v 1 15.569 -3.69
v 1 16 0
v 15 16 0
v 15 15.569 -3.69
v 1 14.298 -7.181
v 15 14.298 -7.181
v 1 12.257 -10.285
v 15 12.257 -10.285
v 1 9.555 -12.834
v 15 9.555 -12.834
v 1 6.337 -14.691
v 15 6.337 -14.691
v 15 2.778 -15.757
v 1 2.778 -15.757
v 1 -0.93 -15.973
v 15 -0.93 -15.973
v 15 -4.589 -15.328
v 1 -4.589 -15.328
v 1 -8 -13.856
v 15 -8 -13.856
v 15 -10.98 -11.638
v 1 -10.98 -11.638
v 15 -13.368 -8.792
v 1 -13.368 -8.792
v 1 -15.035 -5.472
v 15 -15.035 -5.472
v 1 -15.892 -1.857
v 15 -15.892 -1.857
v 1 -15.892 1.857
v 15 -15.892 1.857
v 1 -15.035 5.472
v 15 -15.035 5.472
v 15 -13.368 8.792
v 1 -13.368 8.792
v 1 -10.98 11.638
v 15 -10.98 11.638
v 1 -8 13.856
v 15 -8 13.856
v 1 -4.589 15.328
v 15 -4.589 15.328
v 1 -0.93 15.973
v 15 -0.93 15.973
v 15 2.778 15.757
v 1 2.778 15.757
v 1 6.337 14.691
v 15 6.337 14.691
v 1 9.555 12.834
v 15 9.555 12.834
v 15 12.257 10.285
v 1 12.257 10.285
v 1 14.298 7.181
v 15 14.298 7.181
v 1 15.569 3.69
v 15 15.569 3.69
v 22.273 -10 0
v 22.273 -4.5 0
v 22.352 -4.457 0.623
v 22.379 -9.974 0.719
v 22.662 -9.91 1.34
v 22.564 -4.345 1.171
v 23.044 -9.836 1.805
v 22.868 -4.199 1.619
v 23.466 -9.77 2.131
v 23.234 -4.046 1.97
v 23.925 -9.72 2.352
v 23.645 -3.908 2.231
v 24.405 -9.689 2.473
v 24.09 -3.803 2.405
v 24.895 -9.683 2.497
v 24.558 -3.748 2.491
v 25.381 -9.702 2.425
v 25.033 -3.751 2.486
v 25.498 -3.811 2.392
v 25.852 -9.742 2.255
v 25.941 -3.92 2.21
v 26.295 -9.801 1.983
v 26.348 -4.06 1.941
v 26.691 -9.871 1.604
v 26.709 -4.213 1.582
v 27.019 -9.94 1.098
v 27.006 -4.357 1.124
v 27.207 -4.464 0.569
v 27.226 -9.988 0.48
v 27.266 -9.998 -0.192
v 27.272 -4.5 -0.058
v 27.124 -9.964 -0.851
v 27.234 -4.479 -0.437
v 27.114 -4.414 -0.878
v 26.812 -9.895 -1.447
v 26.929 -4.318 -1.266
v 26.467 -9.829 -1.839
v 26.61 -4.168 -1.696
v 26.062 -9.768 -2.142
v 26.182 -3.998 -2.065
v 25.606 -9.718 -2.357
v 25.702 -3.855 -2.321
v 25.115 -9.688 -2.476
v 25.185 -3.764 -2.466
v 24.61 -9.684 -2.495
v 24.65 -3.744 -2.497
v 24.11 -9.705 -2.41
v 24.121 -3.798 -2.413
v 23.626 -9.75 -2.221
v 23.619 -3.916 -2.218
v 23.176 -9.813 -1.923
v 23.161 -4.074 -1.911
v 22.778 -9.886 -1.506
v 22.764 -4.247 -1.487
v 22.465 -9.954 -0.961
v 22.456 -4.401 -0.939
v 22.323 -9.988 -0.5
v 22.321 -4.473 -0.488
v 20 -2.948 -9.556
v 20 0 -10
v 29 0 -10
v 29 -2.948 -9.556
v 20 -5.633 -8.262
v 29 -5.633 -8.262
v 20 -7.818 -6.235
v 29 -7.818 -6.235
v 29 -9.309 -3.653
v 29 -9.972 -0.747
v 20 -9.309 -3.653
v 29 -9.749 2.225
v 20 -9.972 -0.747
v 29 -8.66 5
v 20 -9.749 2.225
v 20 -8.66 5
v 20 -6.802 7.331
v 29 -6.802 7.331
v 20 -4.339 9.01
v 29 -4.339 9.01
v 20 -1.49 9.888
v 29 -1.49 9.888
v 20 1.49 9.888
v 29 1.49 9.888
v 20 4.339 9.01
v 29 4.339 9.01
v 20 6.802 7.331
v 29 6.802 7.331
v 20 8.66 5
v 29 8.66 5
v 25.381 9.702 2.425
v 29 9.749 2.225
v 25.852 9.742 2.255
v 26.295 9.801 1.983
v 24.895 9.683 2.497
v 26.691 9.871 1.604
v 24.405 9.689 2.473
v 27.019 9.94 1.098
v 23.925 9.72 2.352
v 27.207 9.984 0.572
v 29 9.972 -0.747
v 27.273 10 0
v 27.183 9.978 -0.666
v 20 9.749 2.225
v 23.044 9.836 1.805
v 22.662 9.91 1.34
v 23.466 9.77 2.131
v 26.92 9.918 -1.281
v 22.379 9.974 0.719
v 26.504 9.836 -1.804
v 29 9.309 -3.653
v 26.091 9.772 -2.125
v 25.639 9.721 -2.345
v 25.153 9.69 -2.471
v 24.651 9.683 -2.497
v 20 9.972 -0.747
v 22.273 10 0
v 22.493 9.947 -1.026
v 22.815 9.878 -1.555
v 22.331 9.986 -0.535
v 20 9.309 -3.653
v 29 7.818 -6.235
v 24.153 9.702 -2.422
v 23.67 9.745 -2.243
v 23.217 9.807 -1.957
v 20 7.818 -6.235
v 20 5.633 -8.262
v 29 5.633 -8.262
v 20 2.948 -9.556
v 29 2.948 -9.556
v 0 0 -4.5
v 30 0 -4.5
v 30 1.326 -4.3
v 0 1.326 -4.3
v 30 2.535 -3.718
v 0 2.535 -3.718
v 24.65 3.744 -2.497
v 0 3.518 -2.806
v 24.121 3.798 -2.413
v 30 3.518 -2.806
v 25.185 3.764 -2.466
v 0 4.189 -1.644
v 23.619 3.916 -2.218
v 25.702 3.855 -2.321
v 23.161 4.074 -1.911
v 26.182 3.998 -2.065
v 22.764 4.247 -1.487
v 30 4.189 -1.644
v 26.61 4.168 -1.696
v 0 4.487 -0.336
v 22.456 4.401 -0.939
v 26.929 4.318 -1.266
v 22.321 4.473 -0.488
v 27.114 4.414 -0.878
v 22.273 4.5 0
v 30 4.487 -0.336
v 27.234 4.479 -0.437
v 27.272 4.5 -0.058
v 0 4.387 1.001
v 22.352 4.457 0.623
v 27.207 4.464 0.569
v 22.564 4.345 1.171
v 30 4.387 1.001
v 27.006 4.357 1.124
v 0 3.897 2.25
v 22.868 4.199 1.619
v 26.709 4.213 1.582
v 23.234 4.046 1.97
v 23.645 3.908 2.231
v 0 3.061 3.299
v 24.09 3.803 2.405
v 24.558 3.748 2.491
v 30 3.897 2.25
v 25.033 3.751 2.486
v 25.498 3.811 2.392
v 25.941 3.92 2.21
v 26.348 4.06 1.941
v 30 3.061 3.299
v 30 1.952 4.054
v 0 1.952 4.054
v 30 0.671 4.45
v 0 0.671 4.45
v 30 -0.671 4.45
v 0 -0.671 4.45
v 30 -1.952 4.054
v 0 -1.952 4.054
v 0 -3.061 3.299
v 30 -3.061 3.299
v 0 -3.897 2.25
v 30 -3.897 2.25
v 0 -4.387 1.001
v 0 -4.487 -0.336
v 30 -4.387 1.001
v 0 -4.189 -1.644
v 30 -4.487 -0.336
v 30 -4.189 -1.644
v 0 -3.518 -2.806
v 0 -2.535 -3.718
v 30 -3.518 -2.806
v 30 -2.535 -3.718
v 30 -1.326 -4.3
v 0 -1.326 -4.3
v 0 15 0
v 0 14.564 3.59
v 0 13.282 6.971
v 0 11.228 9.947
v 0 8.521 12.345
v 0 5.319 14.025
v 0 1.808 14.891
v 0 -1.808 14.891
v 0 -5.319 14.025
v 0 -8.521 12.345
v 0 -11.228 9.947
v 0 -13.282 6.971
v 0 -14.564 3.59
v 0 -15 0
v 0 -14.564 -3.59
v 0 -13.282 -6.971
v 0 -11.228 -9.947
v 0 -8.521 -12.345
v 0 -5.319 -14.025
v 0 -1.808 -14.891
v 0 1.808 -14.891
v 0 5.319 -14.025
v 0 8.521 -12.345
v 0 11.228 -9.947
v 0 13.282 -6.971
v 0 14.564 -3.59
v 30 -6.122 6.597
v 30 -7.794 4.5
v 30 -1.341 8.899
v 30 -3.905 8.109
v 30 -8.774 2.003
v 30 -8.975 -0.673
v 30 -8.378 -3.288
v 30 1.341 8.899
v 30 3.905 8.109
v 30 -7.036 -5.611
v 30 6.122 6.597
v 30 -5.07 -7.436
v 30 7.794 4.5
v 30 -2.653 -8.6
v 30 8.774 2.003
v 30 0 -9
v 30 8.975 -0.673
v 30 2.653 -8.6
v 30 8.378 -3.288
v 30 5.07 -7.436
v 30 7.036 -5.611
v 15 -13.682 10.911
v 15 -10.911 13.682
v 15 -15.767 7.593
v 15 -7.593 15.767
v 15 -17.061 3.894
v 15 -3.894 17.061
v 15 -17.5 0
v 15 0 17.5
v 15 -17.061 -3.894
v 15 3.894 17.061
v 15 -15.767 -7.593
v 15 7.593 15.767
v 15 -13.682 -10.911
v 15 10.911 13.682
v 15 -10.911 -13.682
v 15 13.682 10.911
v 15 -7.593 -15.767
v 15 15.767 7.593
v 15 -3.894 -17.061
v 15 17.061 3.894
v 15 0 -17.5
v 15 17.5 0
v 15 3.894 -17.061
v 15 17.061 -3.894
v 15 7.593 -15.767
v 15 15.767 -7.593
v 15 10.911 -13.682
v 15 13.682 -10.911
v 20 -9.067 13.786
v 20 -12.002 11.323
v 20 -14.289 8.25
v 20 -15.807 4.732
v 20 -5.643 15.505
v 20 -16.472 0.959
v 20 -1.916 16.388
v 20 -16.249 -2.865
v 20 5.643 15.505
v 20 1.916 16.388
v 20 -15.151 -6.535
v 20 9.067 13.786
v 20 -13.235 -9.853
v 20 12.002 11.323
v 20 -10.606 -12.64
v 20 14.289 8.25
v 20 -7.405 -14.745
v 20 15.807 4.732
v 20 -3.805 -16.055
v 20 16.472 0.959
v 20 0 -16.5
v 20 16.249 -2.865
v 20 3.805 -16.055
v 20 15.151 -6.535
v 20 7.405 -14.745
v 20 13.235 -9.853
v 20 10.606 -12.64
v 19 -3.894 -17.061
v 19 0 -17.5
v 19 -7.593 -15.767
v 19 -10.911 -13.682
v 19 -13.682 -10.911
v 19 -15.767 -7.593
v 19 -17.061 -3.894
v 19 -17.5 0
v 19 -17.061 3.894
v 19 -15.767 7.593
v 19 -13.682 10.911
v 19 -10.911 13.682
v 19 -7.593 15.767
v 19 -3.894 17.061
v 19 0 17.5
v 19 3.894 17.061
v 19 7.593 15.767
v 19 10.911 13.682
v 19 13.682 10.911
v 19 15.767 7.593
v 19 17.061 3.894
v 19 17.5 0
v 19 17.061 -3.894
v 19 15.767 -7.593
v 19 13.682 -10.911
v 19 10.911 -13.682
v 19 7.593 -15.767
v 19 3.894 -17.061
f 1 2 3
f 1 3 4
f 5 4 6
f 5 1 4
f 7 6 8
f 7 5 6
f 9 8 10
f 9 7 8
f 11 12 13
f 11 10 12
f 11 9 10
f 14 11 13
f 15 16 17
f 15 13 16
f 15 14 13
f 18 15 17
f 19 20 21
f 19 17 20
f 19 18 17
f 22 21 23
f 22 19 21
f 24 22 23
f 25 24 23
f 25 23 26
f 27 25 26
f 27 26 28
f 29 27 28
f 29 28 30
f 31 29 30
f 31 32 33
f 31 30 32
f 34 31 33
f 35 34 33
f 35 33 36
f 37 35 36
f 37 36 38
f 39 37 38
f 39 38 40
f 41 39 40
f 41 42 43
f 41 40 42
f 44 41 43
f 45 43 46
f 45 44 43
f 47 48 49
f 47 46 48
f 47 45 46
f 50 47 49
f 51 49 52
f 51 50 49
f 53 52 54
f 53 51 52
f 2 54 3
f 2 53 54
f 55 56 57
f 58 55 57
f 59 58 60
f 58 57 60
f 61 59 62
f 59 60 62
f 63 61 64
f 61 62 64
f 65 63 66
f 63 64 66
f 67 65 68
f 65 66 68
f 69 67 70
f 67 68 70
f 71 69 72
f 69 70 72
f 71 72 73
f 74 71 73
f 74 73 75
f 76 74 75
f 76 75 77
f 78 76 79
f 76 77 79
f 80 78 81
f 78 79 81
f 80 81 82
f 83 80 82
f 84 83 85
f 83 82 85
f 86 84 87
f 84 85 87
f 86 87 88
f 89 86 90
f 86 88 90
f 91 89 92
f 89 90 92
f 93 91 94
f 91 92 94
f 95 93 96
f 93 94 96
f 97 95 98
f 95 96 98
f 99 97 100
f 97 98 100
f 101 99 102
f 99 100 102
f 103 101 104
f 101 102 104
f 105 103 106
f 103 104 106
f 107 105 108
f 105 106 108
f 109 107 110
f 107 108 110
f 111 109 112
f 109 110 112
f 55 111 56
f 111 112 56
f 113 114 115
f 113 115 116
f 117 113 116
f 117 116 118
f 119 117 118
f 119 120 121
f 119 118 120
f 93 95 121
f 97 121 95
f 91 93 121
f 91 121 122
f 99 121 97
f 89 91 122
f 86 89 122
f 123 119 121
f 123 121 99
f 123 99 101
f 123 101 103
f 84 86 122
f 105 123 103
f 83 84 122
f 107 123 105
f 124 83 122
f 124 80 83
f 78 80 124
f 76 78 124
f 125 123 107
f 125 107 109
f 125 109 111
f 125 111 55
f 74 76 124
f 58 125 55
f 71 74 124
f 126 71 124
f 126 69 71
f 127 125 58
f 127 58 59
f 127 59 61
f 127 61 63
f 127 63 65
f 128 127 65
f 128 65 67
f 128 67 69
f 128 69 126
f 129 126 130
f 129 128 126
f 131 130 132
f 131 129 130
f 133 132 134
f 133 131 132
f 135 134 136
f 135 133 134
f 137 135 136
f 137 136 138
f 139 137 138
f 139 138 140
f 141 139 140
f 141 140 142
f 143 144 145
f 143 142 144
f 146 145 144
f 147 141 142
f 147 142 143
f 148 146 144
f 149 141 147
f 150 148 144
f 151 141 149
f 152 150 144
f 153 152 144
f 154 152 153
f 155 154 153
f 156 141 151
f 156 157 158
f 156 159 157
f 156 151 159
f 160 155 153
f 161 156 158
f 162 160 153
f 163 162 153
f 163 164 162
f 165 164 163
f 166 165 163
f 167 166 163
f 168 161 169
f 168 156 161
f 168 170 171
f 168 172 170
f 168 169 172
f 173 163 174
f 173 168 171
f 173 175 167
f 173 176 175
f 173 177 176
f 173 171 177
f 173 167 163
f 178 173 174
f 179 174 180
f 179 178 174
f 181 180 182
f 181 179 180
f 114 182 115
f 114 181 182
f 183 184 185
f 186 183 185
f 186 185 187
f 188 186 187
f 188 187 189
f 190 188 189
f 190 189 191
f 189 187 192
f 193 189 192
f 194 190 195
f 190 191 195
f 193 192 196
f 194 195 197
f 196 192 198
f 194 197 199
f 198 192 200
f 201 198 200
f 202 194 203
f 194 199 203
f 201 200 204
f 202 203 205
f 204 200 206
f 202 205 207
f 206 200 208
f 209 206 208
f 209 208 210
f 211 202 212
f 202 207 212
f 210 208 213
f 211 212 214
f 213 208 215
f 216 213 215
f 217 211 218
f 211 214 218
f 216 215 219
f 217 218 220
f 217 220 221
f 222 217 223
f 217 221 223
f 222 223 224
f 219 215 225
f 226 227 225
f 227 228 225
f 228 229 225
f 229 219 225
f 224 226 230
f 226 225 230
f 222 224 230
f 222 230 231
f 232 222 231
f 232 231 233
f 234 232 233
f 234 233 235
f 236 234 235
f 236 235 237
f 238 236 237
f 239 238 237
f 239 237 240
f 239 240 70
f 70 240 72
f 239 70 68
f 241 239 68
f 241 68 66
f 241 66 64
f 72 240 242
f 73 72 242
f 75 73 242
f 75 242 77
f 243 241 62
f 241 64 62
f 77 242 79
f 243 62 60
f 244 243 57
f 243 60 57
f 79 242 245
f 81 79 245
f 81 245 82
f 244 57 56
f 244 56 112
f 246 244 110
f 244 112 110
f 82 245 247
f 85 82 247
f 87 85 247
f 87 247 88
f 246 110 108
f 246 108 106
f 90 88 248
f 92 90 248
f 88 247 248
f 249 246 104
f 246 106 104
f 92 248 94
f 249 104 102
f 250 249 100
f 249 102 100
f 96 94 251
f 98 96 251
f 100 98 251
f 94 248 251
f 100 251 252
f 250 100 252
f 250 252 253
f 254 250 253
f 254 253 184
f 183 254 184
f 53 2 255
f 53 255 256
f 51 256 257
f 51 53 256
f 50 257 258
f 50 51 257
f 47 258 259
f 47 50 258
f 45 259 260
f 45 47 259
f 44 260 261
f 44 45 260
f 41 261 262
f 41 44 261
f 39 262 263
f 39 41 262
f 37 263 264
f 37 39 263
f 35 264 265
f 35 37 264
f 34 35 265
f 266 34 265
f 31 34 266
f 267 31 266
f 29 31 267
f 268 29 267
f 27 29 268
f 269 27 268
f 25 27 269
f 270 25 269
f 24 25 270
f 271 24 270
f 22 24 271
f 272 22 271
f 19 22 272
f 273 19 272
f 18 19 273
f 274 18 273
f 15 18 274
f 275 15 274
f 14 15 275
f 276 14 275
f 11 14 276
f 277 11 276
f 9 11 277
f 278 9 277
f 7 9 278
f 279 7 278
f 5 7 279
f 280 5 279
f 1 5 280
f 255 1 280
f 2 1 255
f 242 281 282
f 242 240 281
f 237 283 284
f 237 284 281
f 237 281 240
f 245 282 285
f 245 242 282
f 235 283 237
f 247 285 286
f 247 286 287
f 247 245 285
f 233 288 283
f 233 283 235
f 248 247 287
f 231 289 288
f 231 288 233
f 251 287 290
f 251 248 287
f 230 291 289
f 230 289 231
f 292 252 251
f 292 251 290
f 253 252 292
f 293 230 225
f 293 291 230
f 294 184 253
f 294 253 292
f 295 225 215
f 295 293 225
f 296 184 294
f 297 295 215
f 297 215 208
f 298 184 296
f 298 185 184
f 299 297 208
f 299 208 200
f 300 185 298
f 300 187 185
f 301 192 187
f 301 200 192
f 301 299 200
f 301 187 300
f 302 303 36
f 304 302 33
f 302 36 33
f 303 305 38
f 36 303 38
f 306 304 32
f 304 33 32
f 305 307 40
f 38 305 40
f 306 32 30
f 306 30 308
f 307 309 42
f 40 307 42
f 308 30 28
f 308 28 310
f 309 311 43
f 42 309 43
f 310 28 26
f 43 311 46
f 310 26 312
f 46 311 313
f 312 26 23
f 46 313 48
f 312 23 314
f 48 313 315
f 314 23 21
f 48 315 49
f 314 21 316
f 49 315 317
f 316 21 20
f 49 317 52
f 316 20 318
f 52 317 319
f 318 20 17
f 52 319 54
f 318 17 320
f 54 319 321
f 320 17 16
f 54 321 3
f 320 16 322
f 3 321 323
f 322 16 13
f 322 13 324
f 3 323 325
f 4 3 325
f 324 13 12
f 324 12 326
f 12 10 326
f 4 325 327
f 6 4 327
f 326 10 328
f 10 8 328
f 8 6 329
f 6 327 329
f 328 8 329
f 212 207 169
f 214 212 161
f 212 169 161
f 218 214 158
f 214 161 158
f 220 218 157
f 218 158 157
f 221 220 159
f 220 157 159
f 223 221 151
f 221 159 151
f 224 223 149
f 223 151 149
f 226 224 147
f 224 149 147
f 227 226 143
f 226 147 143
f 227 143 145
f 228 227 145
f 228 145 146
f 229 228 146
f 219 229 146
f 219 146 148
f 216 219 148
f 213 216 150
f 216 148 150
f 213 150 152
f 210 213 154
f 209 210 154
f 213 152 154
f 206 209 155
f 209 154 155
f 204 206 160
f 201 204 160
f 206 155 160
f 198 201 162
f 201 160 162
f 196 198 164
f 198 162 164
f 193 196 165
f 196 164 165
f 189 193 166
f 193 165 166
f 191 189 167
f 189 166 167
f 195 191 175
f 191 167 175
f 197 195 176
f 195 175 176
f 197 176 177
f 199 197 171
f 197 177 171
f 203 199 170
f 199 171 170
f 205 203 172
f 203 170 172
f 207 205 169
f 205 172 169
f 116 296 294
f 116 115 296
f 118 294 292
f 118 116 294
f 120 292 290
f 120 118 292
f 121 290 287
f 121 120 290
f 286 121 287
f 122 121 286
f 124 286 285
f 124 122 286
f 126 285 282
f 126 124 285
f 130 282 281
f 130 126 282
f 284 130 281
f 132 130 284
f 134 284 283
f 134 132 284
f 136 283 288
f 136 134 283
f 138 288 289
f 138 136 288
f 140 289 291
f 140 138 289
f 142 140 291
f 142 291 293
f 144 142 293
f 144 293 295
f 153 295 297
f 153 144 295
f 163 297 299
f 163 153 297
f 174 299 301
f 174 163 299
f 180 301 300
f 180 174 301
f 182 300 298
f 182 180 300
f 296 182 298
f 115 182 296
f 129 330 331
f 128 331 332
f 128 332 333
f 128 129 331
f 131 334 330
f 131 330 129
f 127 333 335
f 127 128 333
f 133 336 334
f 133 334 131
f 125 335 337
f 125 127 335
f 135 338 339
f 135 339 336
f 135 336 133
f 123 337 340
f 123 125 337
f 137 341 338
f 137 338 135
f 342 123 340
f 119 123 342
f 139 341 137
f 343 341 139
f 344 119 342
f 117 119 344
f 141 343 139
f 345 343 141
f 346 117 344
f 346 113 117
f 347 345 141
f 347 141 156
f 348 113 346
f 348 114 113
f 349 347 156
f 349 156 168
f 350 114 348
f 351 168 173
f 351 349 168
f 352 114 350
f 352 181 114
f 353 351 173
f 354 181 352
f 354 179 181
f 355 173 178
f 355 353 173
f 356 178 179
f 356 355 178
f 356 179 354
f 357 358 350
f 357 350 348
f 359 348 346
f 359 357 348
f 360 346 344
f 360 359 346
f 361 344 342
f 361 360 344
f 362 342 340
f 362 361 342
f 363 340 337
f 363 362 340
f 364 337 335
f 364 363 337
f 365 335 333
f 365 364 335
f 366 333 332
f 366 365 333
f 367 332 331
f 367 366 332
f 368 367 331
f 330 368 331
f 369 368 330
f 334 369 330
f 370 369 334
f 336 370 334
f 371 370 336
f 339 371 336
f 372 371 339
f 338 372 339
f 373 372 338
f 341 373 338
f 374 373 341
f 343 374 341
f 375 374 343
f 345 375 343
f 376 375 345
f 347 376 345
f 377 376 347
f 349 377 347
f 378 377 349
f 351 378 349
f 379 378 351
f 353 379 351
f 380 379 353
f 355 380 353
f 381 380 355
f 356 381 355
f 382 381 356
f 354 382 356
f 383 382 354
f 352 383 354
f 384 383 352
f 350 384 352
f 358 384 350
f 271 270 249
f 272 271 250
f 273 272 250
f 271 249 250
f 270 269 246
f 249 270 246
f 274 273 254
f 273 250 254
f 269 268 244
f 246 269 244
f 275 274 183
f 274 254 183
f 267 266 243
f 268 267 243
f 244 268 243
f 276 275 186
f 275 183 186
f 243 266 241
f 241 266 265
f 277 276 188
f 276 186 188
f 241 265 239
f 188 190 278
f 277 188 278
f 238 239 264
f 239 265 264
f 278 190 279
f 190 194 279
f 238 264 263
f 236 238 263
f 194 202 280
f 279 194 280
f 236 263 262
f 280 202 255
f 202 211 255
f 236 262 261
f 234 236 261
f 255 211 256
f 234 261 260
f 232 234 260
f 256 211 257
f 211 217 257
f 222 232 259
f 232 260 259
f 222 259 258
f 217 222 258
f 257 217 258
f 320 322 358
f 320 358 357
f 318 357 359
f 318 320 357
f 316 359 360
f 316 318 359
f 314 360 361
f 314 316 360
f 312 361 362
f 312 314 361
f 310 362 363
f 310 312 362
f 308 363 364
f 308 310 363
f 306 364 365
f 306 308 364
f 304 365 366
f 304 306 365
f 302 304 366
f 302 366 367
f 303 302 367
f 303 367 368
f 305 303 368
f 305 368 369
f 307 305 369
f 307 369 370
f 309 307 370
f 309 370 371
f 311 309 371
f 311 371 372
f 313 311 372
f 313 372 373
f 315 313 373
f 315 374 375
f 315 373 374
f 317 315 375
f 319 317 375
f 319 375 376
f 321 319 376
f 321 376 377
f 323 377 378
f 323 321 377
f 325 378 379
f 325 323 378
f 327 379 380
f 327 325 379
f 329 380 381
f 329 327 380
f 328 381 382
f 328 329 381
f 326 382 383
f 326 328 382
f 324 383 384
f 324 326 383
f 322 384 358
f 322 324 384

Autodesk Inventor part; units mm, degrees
ref_plane "YZ Plane" through (0, 0, 0) normal (1, 0, 0) x (0, 1, 0)
ref_plane "XY Plane" through (0, 0, 0) normal (0, 0, 1) x (1, 0, 0)
sketch "Sketch1" plane through (0, 0, 0) normal (1, 0, 0) x (0, 1, 0)
  circle A0 centre (0, 0) radius 16
  dimension "d0" = 32
extrude "Extrusion1" add sketch "Sketch1" along normal blind 15
sketch "Sketch2" plane through (15, 0, 0) normal (1, 0, 0) x (0, 0, -1)
  circle A0 centre (0, 0) radius 17.5
  dimension "d3" = 35
extrude "Extrusion2" add sketch "Sketch2" along normal blind 5
sketch "Sketch3" plane through (20, 0, 0) normal (1, 0, 0) x (0, 0, -1)
  circle A0 centre (0, 0) radius 10
  dimension "d6" = 20
extrude "Extrusion3" add sketch "Sketch3" along normal blind 10
sketch "Sketch4" plane through (30, 0, 0) normal (1, 0, 0) x (0, 0, -1)
  circle A0 centre (0, 0) radius 4.5
  dimension "d9" = 9
extrude "Extrusion4" cut sketch "Sketch4" against normal blind 58
thread "Thread1" size "M32x1.5" class "6g" standard "ANSI Metric M Profile" length 20
chamfer "Chamfer1" distance 1 angle 45 1 edges at (0, -16, 0)
ref_plane "Work Plane1" through (0, 10, 0) normal (0, 1, 0) x (-1, 0, 0)
sketch "Sketch5" plane through (0, 10, 0) normal (0, 1, 0) x (-1, 0, 0)
  circle A0 centre (-24.773, 0) radius 2.5
  point P0 (0, 0)
  dimension "d19" = 5
extrude "Extrusion5" cut sketch "Sketch5" against normal blind 27.5
thread "Thread2" size "M5x0.5" class "6H" standard "ANSI Metric M Profile" length 20
chamfer "Chamfer2" distance 1 angle 45 2 edges at (20, 0, 17.5) (30, 0, 10)
properties part number "sprocet adaptor"
